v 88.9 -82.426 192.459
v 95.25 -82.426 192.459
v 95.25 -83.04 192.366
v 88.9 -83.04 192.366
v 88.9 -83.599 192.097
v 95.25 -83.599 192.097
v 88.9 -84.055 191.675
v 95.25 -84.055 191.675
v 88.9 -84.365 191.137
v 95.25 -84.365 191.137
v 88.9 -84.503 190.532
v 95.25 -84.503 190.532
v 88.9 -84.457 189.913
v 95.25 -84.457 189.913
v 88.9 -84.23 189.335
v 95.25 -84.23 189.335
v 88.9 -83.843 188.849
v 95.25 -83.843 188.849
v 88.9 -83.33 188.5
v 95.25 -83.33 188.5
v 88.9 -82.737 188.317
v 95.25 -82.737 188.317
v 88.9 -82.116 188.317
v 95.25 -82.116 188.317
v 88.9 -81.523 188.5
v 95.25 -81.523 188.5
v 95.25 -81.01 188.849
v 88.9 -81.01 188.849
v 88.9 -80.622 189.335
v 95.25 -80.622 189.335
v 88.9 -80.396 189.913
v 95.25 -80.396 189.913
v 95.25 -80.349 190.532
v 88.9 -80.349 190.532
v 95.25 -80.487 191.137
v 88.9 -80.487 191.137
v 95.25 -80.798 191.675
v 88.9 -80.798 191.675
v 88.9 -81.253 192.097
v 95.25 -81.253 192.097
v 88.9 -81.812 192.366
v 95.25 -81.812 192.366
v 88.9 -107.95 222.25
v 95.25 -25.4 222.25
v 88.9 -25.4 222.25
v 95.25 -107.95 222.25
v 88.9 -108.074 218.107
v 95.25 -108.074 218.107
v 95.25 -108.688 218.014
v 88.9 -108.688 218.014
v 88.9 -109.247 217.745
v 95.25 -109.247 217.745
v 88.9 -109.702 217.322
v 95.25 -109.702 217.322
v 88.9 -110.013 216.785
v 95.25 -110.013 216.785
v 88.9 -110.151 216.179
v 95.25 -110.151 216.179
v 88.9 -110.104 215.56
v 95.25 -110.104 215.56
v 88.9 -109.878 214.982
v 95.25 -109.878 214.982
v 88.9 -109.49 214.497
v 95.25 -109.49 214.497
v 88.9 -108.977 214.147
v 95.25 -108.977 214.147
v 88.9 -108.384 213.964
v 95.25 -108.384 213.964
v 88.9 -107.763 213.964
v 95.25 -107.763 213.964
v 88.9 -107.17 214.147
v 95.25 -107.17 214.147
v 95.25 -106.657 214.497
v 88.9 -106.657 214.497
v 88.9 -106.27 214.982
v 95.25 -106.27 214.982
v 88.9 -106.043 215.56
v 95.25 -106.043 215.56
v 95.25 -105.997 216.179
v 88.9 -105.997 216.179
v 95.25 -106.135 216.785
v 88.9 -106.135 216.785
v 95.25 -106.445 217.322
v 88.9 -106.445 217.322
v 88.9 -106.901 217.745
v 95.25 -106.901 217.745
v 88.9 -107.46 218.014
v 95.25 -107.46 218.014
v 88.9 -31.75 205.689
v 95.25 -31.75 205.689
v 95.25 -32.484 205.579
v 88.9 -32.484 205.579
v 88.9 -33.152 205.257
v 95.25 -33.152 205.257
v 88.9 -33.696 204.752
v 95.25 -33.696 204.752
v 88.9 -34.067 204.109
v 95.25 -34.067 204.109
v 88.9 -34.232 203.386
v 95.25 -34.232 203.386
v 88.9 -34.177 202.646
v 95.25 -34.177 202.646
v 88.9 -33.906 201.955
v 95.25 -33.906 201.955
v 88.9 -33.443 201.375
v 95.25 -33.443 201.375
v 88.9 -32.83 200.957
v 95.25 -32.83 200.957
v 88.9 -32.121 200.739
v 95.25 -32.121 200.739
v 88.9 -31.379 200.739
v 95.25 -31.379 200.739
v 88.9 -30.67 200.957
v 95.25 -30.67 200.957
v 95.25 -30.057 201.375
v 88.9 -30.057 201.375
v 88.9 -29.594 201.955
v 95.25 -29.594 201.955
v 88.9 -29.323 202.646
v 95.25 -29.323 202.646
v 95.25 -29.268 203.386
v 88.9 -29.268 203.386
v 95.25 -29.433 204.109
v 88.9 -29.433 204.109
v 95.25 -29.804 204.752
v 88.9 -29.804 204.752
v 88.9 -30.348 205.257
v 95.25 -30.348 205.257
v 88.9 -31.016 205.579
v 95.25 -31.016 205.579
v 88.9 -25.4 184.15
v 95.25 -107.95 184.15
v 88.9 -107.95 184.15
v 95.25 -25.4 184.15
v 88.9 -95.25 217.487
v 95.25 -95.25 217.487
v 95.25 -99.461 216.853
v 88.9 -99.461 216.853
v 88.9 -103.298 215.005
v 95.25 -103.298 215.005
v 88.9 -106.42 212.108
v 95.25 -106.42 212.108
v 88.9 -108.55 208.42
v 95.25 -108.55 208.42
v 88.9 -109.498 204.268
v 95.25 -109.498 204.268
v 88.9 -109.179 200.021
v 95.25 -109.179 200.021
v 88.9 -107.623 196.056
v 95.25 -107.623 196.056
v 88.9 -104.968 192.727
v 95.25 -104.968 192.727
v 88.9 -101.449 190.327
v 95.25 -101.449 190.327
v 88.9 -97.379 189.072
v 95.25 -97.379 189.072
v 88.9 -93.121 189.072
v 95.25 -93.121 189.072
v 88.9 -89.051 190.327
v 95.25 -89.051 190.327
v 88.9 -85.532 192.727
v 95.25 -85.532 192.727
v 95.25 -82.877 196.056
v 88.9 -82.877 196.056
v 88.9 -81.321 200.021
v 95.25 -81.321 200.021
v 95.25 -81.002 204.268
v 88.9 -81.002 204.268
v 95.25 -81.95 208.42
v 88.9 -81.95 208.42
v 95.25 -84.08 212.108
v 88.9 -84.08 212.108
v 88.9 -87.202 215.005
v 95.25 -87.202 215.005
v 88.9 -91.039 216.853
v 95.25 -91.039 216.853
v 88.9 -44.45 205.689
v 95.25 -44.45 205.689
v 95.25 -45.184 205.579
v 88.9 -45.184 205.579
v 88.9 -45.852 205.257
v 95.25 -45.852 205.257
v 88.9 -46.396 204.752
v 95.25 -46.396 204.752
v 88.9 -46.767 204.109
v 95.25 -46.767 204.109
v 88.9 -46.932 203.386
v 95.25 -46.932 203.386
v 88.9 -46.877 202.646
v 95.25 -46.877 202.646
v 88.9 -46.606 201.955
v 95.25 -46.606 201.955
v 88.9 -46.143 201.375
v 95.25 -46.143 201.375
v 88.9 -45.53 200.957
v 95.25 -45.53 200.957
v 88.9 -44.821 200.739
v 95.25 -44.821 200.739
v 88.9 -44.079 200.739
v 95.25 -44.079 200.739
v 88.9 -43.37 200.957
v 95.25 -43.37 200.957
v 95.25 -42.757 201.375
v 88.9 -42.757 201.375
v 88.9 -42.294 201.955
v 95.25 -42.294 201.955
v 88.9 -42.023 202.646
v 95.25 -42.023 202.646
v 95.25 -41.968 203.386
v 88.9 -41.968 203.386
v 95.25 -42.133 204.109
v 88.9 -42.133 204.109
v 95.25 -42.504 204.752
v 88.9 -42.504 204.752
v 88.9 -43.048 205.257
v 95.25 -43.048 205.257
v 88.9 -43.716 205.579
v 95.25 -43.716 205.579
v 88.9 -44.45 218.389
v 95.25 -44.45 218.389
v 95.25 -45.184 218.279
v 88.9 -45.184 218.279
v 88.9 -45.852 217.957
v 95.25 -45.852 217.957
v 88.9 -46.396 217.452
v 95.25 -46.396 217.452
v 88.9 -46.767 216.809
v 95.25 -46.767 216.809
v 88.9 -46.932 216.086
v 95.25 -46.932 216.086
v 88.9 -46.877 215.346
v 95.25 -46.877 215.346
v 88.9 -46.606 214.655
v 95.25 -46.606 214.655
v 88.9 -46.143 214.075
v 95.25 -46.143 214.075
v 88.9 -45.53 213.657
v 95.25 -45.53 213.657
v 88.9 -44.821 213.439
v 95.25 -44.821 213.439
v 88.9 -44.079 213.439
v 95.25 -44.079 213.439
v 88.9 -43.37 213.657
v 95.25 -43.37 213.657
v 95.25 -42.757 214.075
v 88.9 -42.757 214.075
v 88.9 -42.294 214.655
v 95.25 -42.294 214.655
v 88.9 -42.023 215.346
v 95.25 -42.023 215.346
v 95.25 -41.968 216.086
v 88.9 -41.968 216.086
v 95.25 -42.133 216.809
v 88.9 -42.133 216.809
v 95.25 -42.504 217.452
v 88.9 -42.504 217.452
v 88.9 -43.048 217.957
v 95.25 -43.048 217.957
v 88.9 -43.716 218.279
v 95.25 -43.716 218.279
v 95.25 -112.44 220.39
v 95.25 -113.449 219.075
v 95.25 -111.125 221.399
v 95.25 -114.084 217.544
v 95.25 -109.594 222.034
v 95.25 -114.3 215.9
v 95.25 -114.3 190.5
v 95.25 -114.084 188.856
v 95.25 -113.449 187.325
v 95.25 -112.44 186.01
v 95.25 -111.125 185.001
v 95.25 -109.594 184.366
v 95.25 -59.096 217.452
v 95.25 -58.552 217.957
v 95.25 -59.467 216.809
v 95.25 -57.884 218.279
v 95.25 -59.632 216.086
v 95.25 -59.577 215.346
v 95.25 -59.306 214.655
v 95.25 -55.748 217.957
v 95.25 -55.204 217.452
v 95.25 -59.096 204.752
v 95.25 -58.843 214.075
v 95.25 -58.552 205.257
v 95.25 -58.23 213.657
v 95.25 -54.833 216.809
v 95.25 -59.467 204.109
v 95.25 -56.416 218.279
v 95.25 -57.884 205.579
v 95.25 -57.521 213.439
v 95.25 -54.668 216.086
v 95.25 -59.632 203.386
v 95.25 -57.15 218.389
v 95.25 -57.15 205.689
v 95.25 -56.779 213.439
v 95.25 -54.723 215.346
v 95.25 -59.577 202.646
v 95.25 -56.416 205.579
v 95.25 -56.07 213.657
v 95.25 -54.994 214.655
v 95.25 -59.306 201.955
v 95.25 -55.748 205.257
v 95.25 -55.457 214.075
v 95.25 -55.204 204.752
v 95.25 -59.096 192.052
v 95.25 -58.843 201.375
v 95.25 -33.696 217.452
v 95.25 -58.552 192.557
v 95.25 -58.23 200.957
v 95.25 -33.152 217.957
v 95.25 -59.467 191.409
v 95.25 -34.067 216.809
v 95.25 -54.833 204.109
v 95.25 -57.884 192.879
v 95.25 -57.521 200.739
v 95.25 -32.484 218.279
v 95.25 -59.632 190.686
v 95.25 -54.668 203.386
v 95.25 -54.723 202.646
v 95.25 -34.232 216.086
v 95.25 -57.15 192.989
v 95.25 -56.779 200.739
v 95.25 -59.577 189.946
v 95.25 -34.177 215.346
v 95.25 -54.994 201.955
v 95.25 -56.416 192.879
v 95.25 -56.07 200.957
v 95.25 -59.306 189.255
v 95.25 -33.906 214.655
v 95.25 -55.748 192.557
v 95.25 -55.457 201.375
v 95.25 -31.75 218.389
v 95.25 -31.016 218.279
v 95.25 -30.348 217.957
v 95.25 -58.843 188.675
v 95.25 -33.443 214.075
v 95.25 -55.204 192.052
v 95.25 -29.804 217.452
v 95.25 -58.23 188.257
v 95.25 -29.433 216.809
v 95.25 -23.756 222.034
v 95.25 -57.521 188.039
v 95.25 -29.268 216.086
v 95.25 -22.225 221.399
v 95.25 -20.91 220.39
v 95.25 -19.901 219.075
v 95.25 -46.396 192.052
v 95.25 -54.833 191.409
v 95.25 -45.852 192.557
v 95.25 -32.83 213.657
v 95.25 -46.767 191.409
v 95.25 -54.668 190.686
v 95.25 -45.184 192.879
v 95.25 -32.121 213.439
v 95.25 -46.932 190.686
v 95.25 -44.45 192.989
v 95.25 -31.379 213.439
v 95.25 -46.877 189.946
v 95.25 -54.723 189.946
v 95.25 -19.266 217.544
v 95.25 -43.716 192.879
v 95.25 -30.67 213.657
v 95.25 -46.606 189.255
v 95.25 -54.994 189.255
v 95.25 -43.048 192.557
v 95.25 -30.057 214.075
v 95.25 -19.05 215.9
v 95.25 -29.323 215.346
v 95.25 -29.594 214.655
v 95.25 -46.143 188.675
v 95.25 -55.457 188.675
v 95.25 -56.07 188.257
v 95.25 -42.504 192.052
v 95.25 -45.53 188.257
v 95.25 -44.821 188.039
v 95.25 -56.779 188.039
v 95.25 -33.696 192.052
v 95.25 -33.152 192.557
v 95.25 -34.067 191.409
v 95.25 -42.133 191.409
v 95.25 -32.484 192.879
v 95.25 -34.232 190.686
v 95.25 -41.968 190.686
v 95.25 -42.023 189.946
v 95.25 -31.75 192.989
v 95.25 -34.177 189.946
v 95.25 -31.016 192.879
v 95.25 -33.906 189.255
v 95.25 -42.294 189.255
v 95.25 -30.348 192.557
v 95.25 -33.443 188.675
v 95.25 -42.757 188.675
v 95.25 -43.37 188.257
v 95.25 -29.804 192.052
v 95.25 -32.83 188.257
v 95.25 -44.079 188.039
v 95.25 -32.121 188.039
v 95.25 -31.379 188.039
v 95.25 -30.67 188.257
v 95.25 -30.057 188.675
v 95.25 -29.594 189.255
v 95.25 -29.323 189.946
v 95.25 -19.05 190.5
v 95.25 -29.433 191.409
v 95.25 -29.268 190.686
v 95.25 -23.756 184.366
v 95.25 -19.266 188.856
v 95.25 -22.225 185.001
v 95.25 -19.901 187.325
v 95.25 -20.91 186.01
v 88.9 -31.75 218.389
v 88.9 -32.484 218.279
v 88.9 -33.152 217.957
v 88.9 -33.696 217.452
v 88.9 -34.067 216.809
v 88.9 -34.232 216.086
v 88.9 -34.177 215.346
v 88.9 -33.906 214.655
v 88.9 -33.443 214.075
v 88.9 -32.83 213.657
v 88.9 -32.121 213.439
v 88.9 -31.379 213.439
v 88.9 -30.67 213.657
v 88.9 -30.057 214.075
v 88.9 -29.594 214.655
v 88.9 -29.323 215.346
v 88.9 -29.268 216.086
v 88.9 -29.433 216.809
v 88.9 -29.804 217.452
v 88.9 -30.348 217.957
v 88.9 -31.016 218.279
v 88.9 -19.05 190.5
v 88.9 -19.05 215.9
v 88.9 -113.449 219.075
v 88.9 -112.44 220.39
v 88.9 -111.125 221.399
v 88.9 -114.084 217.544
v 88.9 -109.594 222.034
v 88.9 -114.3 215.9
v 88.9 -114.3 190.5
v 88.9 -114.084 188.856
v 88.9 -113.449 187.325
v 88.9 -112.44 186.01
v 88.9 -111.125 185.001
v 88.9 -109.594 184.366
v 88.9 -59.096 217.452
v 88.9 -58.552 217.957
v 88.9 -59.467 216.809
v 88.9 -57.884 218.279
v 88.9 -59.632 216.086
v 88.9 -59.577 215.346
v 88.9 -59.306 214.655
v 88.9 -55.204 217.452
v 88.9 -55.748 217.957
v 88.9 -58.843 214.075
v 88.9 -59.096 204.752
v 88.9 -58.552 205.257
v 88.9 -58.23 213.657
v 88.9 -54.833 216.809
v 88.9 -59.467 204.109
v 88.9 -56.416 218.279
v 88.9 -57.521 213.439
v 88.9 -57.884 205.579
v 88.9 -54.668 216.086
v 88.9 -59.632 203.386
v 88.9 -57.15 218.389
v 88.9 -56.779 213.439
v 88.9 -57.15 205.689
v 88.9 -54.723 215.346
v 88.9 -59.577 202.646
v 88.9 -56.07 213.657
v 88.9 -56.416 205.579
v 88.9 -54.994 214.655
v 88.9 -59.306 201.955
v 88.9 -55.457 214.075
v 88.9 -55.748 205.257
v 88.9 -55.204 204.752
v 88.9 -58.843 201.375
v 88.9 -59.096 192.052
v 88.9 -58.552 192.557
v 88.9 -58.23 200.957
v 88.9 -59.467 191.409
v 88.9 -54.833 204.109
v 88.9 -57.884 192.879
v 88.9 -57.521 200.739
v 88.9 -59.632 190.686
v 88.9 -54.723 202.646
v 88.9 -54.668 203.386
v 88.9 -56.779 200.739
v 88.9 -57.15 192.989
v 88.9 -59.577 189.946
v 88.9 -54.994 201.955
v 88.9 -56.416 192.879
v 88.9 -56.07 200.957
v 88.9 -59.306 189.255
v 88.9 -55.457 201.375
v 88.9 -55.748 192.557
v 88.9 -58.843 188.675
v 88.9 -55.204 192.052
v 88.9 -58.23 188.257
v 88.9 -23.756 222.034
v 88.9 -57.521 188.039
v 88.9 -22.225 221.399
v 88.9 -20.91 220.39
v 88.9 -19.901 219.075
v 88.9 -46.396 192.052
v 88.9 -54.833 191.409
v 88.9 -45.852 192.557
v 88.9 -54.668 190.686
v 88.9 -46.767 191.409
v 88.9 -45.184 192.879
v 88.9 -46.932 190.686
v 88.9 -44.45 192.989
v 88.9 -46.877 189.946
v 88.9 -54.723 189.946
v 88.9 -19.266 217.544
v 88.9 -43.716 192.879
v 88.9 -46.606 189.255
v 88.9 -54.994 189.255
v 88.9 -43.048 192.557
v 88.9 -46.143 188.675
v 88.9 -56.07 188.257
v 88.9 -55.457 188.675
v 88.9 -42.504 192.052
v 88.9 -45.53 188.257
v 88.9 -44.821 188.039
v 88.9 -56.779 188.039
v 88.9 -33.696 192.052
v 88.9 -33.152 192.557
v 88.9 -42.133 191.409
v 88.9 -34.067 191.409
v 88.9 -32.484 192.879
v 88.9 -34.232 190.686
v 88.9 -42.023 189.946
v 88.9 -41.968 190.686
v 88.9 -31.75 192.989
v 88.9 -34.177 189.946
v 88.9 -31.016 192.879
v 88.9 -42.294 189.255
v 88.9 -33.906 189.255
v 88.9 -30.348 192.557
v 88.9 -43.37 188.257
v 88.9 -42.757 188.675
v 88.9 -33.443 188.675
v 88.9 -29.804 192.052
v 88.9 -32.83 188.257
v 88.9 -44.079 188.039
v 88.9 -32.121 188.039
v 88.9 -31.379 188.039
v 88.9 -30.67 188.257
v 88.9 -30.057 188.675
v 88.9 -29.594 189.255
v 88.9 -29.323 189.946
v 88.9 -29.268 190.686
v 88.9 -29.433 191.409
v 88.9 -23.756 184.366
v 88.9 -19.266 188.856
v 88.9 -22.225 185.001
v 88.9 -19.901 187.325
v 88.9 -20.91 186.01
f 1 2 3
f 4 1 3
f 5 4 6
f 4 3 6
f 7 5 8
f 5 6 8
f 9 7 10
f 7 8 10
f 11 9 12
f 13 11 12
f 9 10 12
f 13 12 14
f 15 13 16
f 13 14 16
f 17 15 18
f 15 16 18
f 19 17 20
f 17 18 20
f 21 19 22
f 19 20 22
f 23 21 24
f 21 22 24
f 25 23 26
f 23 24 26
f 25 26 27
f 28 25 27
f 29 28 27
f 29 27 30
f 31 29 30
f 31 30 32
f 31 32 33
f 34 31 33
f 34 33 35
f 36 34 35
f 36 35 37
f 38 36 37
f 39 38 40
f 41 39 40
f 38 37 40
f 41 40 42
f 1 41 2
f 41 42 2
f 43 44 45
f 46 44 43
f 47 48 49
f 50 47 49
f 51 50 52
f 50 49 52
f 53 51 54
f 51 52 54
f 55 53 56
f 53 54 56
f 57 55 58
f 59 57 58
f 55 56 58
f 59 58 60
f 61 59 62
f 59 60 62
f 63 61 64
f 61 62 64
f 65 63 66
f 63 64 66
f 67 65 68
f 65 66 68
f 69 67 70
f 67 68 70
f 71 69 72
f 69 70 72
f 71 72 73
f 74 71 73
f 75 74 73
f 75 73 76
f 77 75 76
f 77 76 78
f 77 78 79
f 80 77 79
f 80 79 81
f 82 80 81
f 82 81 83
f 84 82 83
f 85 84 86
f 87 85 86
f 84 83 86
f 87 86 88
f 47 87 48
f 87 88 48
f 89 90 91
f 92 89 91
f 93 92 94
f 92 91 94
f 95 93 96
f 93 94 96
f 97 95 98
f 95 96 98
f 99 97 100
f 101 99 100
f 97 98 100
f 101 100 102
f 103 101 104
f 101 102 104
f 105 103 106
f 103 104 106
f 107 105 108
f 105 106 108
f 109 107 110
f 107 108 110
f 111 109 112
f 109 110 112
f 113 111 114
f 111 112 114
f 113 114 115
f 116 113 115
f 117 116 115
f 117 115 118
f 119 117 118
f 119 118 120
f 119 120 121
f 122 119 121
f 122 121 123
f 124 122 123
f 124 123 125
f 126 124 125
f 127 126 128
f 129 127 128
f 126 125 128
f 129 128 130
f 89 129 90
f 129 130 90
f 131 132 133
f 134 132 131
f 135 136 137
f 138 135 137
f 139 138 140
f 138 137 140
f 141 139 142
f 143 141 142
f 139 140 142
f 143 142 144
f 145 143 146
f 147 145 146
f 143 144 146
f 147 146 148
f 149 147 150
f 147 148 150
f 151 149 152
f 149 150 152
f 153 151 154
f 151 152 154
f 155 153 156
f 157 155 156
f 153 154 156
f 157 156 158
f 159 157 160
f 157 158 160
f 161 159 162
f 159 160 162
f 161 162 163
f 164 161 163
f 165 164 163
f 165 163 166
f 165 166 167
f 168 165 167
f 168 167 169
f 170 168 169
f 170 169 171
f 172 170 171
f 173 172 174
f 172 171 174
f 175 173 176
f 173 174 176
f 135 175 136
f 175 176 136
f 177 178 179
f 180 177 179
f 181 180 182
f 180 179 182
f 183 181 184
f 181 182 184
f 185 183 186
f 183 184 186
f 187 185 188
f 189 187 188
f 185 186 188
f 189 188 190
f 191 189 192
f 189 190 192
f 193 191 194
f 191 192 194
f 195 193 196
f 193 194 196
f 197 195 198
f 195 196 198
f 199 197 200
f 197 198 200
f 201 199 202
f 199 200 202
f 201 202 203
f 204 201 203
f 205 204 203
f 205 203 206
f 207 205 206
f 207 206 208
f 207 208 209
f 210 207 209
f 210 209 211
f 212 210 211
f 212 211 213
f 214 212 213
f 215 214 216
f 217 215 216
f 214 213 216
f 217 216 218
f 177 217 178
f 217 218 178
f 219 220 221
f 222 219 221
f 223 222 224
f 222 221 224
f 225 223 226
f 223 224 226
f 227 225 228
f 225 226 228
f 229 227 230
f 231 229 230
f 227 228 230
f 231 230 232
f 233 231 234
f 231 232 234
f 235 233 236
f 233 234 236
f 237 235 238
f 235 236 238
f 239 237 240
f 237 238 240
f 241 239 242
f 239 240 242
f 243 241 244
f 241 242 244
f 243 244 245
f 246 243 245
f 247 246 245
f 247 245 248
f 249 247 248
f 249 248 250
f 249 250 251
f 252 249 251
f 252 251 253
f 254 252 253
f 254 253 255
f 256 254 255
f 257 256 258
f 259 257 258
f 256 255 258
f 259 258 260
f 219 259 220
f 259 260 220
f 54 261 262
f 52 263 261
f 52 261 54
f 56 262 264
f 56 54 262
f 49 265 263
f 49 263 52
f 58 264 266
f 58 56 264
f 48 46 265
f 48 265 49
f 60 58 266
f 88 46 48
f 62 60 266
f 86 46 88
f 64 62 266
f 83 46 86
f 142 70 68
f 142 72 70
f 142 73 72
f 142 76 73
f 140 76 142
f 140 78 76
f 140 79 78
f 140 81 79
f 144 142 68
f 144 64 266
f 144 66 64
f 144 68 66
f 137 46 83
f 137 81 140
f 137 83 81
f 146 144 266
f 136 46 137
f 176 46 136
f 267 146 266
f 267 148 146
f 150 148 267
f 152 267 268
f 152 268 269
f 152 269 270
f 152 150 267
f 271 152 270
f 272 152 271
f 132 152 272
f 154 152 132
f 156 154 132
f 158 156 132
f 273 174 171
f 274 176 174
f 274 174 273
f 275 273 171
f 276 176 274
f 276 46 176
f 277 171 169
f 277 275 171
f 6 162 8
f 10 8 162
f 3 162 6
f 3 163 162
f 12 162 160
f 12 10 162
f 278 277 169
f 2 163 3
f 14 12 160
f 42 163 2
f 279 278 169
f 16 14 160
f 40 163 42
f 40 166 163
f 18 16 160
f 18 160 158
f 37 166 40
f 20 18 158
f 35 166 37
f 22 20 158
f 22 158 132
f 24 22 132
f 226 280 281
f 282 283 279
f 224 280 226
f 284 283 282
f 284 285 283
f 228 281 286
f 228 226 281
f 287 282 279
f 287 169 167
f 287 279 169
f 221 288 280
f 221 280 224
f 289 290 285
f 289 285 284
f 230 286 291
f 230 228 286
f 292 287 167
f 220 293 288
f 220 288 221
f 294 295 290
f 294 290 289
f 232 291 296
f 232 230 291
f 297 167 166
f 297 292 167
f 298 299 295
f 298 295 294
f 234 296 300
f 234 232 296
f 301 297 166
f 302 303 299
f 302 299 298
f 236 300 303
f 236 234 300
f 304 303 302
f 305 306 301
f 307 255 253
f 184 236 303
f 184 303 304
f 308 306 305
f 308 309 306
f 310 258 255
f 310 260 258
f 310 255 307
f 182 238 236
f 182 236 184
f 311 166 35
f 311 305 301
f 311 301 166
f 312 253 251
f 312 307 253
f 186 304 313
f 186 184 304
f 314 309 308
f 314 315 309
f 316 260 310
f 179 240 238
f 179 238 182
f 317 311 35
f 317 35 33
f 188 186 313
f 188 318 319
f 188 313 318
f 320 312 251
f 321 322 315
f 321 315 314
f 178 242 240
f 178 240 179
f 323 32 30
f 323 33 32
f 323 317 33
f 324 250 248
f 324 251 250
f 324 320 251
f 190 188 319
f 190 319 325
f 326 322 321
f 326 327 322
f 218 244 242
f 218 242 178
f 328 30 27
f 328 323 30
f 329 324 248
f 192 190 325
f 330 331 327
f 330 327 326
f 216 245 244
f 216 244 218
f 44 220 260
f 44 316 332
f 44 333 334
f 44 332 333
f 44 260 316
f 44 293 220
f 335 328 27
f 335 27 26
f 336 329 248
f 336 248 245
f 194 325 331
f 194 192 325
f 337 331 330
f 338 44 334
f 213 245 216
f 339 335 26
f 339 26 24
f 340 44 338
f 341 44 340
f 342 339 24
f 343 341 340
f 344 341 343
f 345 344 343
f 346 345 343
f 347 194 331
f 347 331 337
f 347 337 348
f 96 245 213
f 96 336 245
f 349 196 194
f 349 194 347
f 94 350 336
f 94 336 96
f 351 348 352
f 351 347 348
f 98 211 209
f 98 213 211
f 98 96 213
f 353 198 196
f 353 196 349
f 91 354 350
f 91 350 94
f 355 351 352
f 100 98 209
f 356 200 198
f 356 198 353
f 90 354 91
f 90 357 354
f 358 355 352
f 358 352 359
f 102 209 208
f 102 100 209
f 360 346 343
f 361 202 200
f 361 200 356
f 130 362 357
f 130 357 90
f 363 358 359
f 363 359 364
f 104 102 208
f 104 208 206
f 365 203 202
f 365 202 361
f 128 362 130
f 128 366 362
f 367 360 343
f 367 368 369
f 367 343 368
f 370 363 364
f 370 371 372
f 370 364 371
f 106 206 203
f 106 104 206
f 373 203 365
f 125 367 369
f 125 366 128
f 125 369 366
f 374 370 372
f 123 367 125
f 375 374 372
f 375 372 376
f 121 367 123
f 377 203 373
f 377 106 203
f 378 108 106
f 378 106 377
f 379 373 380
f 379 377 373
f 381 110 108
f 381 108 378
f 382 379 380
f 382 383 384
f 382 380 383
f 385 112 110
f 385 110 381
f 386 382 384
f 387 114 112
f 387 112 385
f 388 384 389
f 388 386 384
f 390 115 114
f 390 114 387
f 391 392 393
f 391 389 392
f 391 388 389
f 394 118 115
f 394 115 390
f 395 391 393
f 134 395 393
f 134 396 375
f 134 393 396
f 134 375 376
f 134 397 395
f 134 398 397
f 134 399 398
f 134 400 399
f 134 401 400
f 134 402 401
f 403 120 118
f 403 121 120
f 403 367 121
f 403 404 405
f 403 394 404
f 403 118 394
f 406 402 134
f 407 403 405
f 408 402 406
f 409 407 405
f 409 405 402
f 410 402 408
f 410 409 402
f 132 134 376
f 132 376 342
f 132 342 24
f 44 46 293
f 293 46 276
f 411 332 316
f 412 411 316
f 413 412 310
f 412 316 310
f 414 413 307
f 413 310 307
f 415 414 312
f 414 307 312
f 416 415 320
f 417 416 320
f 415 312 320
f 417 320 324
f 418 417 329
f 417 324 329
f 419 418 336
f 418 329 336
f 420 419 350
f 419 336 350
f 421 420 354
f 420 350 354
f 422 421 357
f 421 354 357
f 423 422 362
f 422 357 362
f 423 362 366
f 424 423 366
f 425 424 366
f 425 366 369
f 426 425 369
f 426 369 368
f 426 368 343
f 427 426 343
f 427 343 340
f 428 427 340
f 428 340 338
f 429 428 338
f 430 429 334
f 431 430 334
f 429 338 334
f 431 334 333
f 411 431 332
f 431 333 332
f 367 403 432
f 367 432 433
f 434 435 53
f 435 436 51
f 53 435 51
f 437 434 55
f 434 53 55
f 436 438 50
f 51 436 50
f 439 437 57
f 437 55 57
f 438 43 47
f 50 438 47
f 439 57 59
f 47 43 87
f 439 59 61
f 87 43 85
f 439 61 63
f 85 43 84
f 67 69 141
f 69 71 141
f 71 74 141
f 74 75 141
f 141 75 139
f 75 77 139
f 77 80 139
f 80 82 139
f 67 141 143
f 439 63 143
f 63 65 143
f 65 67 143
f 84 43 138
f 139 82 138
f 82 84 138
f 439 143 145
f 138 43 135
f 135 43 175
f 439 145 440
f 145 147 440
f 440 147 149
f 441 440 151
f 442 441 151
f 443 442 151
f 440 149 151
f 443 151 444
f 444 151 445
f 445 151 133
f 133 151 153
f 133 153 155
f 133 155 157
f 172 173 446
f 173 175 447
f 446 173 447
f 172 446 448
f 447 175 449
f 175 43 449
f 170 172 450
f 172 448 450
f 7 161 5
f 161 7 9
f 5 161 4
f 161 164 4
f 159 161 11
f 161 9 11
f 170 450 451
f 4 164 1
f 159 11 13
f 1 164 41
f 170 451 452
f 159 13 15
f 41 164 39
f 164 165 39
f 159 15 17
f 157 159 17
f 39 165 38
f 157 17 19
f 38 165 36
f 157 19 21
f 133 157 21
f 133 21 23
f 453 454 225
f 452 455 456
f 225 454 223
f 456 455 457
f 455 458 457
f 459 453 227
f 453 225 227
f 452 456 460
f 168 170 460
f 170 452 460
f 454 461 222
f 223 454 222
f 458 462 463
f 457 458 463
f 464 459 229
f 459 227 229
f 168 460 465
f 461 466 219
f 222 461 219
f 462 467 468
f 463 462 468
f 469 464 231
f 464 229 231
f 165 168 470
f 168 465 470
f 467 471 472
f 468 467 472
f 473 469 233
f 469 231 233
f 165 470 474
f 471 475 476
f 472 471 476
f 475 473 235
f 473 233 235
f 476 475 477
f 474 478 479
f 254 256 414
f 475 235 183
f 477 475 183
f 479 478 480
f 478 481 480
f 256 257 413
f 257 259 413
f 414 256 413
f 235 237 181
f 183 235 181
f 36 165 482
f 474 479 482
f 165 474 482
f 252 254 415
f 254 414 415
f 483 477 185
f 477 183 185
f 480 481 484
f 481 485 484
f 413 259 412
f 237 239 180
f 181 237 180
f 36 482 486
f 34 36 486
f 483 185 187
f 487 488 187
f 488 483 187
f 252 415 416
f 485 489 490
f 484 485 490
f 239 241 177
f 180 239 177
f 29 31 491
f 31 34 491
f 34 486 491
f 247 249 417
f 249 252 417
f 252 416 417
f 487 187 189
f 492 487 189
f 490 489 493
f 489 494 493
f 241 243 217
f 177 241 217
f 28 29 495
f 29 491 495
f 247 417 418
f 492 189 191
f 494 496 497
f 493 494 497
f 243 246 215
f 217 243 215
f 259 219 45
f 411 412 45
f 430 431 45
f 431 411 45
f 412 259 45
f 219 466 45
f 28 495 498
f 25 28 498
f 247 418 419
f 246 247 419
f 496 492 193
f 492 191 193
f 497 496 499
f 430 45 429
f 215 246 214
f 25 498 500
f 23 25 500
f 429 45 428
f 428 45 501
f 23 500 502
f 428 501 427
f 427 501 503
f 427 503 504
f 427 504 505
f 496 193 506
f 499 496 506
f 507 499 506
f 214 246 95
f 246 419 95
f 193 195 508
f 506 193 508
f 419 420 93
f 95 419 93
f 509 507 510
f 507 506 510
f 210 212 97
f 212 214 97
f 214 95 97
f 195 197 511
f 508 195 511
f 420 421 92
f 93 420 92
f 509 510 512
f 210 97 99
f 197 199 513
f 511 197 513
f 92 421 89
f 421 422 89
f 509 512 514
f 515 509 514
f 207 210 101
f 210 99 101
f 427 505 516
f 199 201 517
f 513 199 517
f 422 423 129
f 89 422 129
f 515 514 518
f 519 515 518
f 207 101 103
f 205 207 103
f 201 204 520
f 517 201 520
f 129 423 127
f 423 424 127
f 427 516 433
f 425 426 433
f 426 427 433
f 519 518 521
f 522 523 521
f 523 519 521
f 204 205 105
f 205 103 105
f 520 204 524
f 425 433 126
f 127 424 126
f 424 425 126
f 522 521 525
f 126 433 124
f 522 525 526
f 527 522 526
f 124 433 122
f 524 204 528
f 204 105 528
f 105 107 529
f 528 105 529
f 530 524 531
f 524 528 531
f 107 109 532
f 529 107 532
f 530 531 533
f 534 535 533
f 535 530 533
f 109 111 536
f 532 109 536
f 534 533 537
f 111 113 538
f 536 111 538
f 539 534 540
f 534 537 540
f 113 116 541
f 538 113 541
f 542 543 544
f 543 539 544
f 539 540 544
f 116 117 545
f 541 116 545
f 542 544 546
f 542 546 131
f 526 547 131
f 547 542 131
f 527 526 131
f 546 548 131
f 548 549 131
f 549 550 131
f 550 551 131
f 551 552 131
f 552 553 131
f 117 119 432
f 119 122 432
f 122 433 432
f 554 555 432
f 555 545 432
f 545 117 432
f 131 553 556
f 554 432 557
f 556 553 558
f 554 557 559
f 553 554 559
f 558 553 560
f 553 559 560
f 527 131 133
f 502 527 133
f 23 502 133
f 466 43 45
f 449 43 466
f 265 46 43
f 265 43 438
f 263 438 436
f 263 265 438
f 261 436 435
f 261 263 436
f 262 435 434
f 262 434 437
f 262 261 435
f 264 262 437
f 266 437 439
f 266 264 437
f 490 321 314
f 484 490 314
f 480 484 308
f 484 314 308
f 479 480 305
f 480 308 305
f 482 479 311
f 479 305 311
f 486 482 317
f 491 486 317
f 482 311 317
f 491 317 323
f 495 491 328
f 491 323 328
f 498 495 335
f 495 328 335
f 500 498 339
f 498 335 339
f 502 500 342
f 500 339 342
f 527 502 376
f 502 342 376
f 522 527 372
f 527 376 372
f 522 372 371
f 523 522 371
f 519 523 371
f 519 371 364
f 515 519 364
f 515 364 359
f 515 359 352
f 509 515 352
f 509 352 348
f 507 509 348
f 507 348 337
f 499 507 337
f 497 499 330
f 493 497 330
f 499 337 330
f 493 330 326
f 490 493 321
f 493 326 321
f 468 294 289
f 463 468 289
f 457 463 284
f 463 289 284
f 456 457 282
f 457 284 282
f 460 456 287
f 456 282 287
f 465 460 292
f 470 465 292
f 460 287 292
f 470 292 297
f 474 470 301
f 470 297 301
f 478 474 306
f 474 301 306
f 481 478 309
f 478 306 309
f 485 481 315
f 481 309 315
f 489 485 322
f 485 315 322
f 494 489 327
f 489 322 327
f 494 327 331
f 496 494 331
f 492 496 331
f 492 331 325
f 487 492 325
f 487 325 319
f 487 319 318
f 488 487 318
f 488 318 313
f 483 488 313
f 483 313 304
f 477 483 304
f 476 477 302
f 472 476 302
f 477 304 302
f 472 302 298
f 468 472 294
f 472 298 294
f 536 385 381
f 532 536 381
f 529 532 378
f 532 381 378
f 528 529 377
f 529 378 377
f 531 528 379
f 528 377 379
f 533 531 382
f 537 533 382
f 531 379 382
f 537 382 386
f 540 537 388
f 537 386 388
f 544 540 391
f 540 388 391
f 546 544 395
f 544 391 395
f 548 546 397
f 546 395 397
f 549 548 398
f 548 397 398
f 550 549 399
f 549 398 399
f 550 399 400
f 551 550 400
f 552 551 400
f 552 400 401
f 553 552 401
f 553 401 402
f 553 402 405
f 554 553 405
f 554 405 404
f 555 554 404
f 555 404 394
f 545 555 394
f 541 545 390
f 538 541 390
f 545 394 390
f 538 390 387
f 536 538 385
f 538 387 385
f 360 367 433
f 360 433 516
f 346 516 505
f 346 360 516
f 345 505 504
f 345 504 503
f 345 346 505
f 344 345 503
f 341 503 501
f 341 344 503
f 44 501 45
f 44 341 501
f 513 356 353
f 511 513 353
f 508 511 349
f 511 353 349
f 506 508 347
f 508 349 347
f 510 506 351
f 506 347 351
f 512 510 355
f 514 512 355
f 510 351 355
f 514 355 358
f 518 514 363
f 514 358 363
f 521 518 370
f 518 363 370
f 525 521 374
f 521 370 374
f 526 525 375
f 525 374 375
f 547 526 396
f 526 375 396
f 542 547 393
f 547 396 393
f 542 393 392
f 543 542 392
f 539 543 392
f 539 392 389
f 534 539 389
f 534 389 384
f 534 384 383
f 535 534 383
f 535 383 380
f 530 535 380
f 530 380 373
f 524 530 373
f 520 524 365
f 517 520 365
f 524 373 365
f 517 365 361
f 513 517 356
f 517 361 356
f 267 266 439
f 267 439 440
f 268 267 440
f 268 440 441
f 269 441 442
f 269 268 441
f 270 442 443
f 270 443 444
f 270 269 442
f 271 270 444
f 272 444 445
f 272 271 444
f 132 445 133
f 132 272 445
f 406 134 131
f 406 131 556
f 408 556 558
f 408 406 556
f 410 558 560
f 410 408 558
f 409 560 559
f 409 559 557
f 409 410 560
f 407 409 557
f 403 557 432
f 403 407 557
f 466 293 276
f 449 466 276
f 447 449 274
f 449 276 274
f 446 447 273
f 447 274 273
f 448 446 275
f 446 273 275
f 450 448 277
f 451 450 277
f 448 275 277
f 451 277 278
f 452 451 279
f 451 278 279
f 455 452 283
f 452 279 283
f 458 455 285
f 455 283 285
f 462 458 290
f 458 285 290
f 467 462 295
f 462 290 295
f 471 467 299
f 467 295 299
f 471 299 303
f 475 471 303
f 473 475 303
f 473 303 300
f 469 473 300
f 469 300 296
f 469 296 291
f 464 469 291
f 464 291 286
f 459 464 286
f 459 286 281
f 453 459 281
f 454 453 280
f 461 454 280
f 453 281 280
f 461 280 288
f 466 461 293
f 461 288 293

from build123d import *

# Parameters (mm, degrees)
SKETCH1_R           = 2.0828
SKETCH1_R_2         = 14.2875
SKETCH1_R_3         = 2.4892
BOSS_EXTRUDE1_DEPTH = 6.35


with BuildPart() as part:
    # Sketch1 → Boss-Extrude1 (new body)
    with BuildSketch(Plane(origin=(95.25, 0, 0), x_dir=(0, 0, -1), z_dir=(1, 0, 0))):
        with BuildLine():
            Line((-184.15, -107.95), (-184.15, -25.4))
            ThreePointArc((-184.15, -25.4), (-186.009871939, -20.909871939), (-190.5, -19.05))
            Line((-190.5, -19.05), (-215.9, -19.05))
            ThreePointArc((-215.9, -19.05), (-220.390128061, -20.909871939), (-222.25, -25.4))
            Line((-222.25, -25.4), (-222.25, -107.95))
            ThreePointArc((-222.25, -107.95), (-220.390128061, -112.440128061), (-215.9, -114.3))
            Line((-215.9, -114.3), (-190.5, -114.3))
            ThreePointArc((-190.5, -114.3), (-186.009871939, -112.440128061), (-184.15, -107.95))
        make_face()
        with Locations(Location((-190.376194259, -82.426194259, 0), (0, 0, 180))):
            Circle(SKETCH1_R, mode=Mode.SUBTRACT)
        with Locations(Location((-216.023805741, -108.073805741, 0), (0, 0, 180))):
            Circle(SKETCH1_R, mode=Mode.SUBTRACT)
        with Locations(Location((-203.2, -95.25, 0), (0, 0, 180))):
            Circle(SKETCH1_R_2, mode=Mode.SUBTRACT)
        with Locations(Location((-215.9, -31.75, 0), (0, 0, 180))):
            Circle(SKETCH1_R_3, mode=Mode.SUBTRACT)
        with Locations(Location((-203.2, -31.75, 0), (0, 0, 180))):
            Circle(SKETCH1_R_3, mode=Mode.SUBTRACT)
        with Locations(Location((-190.5, -31.75, 0), (0, 0, 180))):
            Circle(SKETCH1_R_3, mode=Mode.SUBTRACT)
        with Locations(Location((-215.9, -57.15, 0), (0, 0, 180))):
            Circle(SKETCH1_R_3, mode=Mode.SUBTRACT)
        with Locations(Location((-203.2, -57.15, 0), (0, 0, 180))):
            Circle(SKETCH1_R_3, mode=Mode.SUBTRACT)
        with Locations(Location((-190.5, -57.15, 0), (0, 0, 180))):
            Circle(SKETCH1_R_3, mode=Mode.SUBTRACT)
        with Locations(Location((-215.9, -44.45, 0), (0, 0, 180))):
            Circle(SKETCH1_R_3, mode=Mode.SUBTRACT)
        with Locations(Location((-203.2, -44.45, 0), (0, 0, 180))):
            Circle(SKETCH1_R_3, mode=Mode.SUBTRACT)
        with Locations(Location((-190.5, -44.45, 0), (0, 0, 180))):
            Circle(SKETCH1_R_3, mode=Mode.SUBTRACT)
    extrude(amount=-BOSS_EXTRUDE1_DEPTH)


solid = part.part
